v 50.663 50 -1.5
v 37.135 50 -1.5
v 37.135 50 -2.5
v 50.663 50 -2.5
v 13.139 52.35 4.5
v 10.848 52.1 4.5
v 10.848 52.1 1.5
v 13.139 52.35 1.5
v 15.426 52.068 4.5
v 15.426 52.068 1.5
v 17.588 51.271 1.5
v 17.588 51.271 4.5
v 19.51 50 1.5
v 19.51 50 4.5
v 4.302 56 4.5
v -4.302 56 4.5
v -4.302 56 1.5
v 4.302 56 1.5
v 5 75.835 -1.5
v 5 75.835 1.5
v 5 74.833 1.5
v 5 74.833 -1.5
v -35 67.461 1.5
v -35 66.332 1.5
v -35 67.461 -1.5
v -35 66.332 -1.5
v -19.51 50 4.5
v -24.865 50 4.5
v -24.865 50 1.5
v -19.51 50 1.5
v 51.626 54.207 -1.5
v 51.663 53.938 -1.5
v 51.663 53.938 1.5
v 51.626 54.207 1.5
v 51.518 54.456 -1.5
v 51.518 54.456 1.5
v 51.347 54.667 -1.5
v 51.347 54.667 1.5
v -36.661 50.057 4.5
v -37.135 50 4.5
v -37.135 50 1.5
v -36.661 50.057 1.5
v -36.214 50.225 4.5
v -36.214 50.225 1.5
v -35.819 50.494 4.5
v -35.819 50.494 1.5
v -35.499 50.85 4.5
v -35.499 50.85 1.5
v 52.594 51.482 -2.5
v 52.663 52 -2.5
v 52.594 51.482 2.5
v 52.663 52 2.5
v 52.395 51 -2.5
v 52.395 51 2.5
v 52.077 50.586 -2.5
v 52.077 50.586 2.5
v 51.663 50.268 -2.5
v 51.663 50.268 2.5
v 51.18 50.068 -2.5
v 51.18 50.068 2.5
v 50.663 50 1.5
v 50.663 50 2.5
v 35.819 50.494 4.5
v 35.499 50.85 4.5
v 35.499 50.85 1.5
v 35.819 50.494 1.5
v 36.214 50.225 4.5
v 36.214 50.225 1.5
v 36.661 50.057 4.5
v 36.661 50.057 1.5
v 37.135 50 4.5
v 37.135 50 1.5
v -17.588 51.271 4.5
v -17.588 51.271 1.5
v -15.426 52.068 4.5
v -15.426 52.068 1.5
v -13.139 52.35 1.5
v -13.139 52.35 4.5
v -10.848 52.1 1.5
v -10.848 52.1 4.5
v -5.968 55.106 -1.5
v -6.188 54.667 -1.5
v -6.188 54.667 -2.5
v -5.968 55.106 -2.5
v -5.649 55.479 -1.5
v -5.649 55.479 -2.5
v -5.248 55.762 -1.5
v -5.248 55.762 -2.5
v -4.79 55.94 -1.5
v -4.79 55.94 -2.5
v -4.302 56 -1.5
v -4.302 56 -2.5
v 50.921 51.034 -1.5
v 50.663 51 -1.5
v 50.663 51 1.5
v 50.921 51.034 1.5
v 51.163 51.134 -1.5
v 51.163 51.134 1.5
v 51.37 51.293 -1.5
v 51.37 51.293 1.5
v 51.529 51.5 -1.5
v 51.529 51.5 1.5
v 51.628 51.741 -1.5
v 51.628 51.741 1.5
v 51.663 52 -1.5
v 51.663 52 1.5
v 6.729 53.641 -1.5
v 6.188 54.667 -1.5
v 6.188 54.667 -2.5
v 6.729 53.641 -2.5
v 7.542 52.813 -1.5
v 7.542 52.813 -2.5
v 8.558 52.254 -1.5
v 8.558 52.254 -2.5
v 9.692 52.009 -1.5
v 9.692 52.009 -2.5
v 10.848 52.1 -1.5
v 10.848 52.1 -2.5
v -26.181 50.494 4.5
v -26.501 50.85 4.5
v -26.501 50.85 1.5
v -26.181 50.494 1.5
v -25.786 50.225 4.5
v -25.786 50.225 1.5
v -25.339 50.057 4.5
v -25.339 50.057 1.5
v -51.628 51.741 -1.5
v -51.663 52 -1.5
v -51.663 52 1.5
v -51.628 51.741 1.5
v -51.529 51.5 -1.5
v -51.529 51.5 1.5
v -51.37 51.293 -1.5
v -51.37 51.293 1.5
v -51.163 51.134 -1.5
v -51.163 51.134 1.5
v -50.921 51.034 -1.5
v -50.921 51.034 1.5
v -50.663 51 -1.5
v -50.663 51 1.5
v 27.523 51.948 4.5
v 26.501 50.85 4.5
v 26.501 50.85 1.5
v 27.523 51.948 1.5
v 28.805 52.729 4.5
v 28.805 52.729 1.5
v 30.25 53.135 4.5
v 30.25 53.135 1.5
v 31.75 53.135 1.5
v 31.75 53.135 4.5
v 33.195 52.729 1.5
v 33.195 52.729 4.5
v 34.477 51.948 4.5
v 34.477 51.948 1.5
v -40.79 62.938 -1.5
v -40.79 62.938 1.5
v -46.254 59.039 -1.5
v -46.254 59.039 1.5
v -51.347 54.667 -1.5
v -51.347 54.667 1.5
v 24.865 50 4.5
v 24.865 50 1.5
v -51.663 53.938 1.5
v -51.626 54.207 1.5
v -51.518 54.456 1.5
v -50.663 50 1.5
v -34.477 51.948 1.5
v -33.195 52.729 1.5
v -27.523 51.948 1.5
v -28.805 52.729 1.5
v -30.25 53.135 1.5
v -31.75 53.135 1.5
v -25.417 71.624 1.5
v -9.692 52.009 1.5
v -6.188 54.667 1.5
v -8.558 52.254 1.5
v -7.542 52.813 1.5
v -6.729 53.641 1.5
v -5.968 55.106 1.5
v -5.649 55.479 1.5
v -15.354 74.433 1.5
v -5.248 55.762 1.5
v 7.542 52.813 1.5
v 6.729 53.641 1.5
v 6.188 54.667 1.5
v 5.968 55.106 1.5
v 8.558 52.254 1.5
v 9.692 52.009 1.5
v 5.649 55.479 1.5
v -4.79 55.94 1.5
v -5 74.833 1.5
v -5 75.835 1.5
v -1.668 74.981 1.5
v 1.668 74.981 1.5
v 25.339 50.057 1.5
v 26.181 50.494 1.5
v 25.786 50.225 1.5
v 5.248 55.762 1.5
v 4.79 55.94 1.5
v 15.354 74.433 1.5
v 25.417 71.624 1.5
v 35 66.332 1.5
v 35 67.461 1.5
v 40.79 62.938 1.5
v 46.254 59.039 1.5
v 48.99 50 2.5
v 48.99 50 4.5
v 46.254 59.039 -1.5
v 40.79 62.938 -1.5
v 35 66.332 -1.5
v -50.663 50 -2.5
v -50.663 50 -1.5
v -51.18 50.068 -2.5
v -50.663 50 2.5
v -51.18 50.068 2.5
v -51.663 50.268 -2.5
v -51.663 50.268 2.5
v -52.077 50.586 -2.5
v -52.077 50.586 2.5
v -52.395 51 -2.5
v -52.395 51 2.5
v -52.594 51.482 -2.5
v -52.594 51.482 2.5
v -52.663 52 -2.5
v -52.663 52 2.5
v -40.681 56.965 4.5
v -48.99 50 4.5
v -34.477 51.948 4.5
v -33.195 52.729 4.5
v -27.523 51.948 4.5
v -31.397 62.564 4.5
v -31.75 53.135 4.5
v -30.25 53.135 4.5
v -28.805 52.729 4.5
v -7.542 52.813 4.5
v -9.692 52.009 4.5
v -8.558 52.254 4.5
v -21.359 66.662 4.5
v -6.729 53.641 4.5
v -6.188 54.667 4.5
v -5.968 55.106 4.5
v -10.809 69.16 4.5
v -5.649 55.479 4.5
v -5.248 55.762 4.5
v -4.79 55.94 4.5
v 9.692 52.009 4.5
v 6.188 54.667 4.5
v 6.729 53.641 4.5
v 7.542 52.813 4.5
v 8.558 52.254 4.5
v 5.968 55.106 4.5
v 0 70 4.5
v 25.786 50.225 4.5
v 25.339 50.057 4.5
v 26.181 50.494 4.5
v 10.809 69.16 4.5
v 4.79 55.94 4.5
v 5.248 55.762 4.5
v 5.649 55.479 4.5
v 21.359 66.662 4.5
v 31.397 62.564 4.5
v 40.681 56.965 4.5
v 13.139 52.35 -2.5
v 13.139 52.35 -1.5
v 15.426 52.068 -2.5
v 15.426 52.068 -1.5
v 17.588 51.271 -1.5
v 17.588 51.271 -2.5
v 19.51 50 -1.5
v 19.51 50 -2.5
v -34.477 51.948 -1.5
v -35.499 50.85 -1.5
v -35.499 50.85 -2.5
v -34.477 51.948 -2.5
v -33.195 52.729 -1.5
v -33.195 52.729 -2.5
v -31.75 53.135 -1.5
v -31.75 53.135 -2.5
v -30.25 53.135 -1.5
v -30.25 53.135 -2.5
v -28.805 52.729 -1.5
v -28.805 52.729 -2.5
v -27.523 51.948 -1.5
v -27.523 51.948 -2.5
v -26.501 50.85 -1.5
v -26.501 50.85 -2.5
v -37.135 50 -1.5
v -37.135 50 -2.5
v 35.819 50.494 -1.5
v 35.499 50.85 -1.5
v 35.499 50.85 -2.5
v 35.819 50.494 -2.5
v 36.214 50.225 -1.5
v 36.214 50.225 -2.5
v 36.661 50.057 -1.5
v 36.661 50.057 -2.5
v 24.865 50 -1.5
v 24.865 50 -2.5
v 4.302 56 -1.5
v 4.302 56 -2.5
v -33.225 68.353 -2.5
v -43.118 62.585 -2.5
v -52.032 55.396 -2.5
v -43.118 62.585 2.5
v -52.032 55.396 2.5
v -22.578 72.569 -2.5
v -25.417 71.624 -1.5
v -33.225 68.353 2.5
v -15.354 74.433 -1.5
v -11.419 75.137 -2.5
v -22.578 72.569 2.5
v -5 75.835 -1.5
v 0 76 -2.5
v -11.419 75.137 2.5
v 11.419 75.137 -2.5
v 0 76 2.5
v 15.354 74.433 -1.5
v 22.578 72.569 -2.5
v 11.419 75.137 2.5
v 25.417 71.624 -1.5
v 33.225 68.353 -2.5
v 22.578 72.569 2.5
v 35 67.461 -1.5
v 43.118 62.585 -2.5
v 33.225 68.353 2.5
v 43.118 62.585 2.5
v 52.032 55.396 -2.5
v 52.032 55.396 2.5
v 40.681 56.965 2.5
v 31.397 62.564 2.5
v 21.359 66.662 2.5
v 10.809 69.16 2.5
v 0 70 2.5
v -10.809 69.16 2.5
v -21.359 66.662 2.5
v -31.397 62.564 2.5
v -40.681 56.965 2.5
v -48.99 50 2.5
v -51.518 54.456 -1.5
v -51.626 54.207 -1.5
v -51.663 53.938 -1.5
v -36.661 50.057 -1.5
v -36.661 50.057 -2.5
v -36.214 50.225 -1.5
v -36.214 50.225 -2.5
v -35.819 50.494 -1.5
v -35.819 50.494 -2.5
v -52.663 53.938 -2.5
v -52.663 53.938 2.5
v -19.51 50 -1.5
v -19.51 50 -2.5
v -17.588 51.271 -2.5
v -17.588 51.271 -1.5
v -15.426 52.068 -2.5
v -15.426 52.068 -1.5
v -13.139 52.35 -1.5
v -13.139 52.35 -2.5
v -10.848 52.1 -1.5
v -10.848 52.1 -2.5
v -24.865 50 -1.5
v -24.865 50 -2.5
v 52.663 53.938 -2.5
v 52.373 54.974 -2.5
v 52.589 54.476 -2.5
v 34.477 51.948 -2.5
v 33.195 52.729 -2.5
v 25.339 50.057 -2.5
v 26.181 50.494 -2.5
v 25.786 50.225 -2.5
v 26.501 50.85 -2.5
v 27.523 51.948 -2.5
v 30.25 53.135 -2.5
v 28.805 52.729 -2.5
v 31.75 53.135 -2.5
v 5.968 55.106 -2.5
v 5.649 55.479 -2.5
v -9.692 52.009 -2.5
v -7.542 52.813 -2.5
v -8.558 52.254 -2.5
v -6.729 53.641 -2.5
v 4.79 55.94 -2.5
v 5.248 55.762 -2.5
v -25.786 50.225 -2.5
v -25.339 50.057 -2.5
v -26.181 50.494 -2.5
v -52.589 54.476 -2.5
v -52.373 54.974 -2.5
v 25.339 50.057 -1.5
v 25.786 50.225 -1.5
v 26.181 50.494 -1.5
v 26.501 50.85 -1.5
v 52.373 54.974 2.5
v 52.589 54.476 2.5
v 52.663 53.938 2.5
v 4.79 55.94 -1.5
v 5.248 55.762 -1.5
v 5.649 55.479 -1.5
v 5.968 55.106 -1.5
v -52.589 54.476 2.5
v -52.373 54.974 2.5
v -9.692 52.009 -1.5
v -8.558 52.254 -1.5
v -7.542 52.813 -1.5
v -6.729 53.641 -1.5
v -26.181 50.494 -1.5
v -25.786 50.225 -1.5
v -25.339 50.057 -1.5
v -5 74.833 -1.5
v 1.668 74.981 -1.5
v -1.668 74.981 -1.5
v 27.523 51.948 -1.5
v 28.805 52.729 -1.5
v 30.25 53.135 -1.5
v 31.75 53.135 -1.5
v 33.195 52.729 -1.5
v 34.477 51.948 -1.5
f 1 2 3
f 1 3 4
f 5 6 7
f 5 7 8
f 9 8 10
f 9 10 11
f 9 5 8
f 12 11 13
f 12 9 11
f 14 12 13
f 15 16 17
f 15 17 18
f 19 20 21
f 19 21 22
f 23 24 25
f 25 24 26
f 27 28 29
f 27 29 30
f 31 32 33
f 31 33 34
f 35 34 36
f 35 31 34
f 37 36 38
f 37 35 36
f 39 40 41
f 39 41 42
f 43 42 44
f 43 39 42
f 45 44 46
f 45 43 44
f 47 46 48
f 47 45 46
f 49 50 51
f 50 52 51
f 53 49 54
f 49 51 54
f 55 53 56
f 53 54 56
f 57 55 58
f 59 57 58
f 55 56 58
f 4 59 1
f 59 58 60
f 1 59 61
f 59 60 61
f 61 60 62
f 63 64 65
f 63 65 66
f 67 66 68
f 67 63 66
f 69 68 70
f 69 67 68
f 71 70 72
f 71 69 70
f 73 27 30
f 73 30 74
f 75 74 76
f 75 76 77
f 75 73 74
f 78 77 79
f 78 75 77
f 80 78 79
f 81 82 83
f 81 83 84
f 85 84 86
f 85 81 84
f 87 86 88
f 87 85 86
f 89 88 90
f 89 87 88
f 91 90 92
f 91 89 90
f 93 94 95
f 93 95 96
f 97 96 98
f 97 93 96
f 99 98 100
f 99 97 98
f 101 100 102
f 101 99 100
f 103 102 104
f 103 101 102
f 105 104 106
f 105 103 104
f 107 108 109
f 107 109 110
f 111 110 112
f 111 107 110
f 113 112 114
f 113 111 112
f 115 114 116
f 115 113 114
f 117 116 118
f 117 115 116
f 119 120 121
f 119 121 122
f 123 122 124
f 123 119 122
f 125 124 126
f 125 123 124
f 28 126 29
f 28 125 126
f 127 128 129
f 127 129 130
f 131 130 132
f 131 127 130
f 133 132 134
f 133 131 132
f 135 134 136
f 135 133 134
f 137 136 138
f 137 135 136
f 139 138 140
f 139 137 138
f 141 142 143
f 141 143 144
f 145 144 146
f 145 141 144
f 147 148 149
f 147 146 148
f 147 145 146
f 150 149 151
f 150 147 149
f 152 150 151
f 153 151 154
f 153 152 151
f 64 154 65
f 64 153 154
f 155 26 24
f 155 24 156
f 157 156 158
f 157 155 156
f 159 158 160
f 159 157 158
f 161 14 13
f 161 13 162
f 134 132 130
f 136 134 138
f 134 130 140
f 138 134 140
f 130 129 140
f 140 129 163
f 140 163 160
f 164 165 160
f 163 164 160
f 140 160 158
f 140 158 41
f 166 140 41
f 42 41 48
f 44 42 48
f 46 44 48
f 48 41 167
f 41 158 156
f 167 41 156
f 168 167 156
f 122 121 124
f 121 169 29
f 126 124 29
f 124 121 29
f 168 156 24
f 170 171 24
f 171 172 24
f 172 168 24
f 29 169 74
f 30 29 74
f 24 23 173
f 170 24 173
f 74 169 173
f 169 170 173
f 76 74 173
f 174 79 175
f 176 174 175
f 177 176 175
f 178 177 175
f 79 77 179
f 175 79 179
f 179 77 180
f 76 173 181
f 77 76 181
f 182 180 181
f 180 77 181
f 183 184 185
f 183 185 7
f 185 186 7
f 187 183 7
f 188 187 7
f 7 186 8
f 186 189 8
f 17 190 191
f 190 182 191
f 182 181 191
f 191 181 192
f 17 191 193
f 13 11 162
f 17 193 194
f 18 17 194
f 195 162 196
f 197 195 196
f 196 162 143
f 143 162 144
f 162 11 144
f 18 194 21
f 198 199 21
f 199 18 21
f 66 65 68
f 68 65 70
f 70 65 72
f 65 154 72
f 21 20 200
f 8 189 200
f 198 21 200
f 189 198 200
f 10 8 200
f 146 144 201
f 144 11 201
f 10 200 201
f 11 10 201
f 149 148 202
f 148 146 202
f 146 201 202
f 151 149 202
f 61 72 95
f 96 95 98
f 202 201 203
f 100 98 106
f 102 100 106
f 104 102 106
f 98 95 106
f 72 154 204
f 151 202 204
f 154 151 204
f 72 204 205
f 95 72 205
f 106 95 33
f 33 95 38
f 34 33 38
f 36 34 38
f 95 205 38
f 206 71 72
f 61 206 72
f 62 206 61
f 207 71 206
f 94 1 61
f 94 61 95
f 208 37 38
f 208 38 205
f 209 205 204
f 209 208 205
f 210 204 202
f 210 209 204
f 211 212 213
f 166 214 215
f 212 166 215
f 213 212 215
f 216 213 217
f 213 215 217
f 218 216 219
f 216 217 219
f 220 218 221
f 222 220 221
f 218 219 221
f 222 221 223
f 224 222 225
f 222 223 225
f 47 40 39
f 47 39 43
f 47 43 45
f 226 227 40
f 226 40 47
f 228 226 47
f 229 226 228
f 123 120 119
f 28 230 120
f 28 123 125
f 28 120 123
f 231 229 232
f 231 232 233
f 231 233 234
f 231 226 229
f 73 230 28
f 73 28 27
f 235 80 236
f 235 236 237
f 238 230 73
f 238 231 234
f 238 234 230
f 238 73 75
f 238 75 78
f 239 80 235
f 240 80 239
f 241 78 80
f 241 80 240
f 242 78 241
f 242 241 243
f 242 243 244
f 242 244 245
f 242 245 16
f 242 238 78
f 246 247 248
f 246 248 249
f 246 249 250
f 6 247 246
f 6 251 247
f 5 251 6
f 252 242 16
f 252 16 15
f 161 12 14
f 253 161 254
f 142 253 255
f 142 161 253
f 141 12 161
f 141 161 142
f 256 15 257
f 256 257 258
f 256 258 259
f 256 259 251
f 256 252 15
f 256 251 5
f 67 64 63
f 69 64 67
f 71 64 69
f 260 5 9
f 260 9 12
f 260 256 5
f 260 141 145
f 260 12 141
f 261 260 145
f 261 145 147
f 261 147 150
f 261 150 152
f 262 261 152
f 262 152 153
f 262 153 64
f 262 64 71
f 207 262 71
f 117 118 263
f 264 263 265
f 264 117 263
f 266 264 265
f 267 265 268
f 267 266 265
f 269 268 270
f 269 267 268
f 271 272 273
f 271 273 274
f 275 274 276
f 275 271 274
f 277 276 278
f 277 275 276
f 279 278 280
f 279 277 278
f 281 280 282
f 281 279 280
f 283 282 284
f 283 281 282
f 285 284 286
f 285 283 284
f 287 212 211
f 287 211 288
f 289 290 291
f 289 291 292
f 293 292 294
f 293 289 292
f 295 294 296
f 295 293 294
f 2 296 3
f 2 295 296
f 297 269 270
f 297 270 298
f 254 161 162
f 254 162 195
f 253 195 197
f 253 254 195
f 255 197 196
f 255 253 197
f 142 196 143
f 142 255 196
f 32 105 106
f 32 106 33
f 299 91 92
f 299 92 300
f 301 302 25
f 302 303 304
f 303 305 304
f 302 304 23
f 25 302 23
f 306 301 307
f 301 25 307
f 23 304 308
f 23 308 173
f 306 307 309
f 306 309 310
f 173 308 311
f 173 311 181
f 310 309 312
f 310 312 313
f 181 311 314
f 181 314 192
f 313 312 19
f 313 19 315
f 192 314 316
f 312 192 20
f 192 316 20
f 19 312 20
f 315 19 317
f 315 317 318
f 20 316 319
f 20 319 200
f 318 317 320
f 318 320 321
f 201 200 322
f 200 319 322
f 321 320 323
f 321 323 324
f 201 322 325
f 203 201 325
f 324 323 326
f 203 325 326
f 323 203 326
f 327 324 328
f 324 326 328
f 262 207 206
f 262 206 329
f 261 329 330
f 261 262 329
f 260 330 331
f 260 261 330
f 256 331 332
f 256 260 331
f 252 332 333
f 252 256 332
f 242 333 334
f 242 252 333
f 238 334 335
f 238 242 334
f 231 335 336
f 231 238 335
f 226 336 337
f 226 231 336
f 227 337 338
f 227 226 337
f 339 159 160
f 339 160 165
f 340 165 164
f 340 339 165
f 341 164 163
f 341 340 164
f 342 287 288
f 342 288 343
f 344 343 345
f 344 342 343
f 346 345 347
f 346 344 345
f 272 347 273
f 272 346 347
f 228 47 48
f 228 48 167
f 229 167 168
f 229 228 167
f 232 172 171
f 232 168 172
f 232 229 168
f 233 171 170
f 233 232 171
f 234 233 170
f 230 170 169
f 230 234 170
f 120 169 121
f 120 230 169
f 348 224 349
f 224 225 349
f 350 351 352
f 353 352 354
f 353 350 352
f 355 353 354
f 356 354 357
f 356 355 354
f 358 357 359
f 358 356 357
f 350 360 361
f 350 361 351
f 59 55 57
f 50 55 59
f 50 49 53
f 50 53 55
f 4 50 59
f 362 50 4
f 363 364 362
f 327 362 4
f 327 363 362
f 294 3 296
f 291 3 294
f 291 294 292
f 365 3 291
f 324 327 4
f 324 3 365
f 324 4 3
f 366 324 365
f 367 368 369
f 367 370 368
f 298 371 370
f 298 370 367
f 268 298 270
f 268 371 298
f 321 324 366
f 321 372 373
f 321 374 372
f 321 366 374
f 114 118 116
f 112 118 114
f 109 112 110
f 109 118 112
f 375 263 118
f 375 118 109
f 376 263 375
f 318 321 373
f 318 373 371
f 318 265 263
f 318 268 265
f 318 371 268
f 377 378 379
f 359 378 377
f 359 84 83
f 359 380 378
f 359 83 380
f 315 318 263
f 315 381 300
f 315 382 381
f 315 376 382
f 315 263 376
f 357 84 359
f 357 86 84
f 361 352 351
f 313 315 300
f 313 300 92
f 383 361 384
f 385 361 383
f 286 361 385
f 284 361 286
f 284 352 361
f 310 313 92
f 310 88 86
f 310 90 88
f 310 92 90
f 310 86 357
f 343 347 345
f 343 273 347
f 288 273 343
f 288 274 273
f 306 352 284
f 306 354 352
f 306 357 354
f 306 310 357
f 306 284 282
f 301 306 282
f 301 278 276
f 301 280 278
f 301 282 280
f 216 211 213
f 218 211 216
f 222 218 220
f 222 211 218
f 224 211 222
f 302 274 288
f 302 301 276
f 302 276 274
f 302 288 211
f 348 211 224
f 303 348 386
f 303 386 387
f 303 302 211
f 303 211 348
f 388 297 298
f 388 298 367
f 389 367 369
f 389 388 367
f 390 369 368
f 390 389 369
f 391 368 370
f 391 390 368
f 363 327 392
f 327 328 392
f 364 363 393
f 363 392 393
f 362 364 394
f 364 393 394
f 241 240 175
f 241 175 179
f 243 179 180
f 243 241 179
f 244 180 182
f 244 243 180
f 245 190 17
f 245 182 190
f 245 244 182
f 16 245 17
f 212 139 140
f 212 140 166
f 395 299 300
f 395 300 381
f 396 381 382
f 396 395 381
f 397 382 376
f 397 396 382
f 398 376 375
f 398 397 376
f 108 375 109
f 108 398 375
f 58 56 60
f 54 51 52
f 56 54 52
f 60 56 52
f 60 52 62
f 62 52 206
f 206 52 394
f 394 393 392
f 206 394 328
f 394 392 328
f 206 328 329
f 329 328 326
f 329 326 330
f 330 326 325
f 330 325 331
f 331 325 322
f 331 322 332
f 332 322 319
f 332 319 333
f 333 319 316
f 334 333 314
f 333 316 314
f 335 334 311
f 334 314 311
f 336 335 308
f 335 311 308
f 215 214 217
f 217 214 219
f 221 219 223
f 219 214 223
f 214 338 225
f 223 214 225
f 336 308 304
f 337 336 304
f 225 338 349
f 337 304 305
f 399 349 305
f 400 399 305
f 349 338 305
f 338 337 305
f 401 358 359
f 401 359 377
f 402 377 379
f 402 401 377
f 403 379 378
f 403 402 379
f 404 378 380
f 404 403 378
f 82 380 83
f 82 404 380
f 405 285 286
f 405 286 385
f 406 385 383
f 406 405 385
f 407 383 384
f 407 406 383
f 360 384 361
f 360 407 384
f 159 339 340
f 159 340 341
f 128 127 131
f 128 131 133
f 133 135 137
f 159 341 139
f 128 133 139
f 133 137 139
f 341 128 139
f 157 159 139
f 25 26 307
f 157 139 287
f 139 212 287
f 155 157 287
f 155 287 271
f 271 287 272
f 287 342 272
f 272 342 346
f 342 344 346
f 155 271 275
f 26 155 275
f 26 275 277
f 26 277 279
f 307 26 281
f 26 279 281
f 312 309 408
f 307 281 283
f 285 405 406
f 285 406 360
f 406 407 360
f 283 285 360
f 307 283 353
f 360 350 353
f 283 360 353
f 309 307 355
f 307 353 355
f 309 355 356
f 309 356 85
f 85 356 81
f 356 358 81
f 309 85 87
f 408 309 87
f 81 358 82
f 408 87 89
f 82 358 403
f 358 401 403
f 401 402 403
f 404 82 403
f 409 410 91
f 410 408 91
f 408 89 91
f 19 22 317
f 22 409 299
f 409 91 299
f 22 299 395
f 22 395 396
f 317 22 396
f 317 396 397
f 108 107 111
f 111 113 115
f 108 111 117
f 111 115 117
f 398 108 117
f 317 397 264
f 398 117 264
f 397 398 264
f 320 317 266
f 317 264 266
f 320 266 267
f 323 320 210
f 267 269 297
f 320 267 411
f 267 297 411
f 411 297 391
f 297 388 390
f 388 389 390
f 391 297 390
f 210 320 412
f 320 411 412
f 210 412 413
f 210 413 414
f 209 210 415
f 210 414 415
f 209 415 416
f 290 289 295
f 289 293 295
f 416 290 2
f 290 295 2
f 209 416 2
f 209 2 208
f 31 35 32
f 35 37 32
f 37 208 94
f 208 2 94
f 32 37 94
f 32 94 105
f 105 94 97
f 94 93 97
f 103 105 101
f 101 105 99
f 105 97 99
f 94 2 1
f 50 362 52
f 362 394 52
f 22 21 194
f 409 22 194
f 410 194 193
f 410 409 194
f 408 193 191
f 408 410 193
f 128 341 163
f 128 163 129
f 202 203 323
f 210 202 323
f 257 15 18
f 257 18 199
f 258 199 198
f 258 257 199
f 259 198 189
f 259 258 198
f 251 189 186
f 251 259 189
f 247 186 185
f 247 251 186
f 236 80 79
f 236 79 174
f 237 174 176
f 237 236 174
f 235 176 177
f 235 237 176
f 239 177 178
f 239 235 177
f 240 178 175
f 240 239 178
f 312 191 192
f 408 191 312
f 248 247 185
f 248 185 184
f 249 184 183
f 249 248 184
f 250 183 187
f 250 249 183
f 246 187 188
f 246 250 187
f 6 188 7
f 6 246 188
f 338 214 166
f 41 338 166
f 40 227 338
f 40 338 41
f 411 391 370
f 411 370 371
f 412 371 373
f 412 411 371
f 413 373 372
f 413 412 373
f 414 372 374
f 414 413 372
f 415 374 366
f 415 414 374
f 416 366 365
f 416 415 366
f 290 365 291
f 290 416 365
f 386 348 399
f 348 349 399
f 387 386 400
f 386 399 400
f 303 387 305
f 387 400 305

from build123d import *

# Parameters (mm, degrees)
BOSS_EXTRUDE1_DEPTH = 2.5
SHELL1_START        = -1.5
SHELL1_DEPTH        = 3
BOSS_EXTRUDE2_START = 2
BOSS_EXTRUDE2_DEPTH = 2
SKETCH4_W           = 30
SKETCH4_H           = 3
CUT_EXTRUDE1_DEPTH  = 100


# Read off the part's stored shape, not the designer's step: Shell1
with BuildPart() as part:
    # Sketch1 → Boss-Extrude1 (new, symmetric)
    with BuildSketch(Plane.XY):
        with BuildLine():
            ThreePointArc((-50.662558564, 50), (-52.076772126, 50.585786438), (-52.662558564, 52))
            Line((-52.662558564, 52), (-52.662558564, 53.937975118))
            ThreePointArc((-52.662558564, 53.937975118), (-52.498112524, 54.732167576), (-52.031816903, 55.395758229))
            ThreePointArc((-52.031816903, 55.395758229), (0, 76), (52.031816903, 55.395758229))
            ThreePointArc((52.031816903, 55.395758229), (52.498112524, 54.732167576), (52.662558564, 53.937975118))
            Line((52.662558564, 53.937975118), (52.662558564, 52))
            ThreePointArc((52.662558564, 52), (52.076772126, 50.585786438), (50.662558564, 50))
            Line((50.662558564, 50), (48.989794856, 50))
            ThreePointArc((48.989794856, 50), (0, 70), (-48.989794856, 50))
            Line((-48.989794856, 50), (-50.662558564, 50))
        make_face()
        with BuildLine():
            ThreePointArc((4.302180061, 56), (5.456880599, 55.632993162), (6.187798144, 54.666666667))
            ThreePointArc((6.187798144, 54.666666667), (8.029260752, 52.496291392), (10.847853752, 52.1))
            ThreePointArc((10.847853752, 52.1), (15.425940788, 52.068491802), (19.510205144, 50))
            Line((19.510205144, 50), (24.864501465, 50))
            ThreePointArc((24.864501465, 50), (25.78632175, 50.22510638), (26.500634408, 50.849752638))
            ThreePointArc((26.500634408, 50.849752638), (31, 53.186572392), (35.499365592, 50.849752638))
            ThreePointArc((35.499365592, 50.849752638), (36.21367825, 50.22510638), (37.135498535, 50))
            Line((37.135498535, 50), (48.989794856, 50))
            ThreePointArc((48.989794856, 50), (0, 70), (-48.989794856, 50))
            Line((-48.989794856, 50), (-37.135498535, 50))
            ThreePointArc((-37.135498535, 50), (-36.21367825, 50.22510638), (-35.499365592, 50.849752638))
            ThreePointArc((-35.499365592, 50.849752638), (-31, 53.186572392), (-26.500634408, 50.849752638))
            ThreePointArc((-26.500634408, 50.849752638), (-25.78632175, 50.22510638), (-24.864501465, 50))
            Line((-24.864501465, 50), (-19.510205144, 50))
            ThreePointArc((-19.510205144, 50), (-15.425940788, 52.068491802), (-10.847853752, 52.1))
            ThreePointArc((-10.847853752, 52.1), (-8.029260752, 52.496291392), (-6.187798144, 54.666666667))
            ThreePointArc((-6.187798144, 54.666666667), (-5.456880599, 55.632993162), (-4.302180061, 56))
            Line((-4.302180061, 56), (4.302180061, 56))
        make_face()
    extrude(amount=BOSS_EXTRUDE1_DEPTH, both=True)

    # Shell1 outline → Shell1 (cut)
    with BuildSketch(Plane.XY.offset(SHELL1_START)):
        with BuildLine():
            Line((37.135498535, 50), (50.662558564, 50))
            Line((50.662558564, 50), (50.662558564, 51))
            ThreePointArc((50.662558564, 51), (51.369665345, 51.292893219), (51.662558564, 52))
            Line((51.662558564, 52), (51.662558564, 53.937975118))
            ThreePointArc((51.662558564, 53.937975118), (51.580335544, 54.335071347), (51.347187733, 54.666866673))
            ThreePointArc((51.347187733, 54.666866673), (0, 75), (-51.347187733, 54.666866673))
            ThreePointArc((-51.347187733, 54.666866673), (-51.580335544, 54.335071347), (-51.662558564, 53.937975118))
            Line((-51.662558564, 53.937975118), (-51.662558564, 52))
            ThreePointArc((-51.662558564, 52), (-51.369665345, 51.292893219), (-50.662558564, 51))
            Line((-50.662558564, 51), (-50.662558564, 50))
            Line((-50.662558564, 50), (-37.135498535, 50))
            ThreePointArc((-37.135498535, 50), (-36.21367825, 50.22510638), (-35.499365592, 50.849752638))
            ThreePointArc((-35.499365592, 50.849752638), (-31, 53.186572392), (-26.500634408, 50.849752638))
            ThreePointArc((-26.500634408, 50.849752638), (-25.78632175, 50.22510638), (-24.864501465, 50))
            Line((-24.864501465, 50), (-19.510205144, 50))
            ThreePointArc((-19.510205144, 50), (-15.425940787, 52.068491802), (-10.847853752, 52.1))
            ThreePointArc((-10.847853752, 52.1), (-8.029260752, 52.496291392), (-6.187798144, 54.666666667))
            ThreePointArc((-6.187798144, 54.666666667), (-5.456880599, 55.632993162), (-4.302180061, 56))
            Line((-4.302180061, 56), (4.302180061, 56))
            ThreePointArc((4.302180061, 56), (5.456880599, 55.632993162), (6.187798144, 54.666666667))
            ThreePointArc((6.187798144, 54.666666667), (8.029260752, 52.496291392), (10.847853752, 52.1))
            ThreePointArc((10.847853752, 52.1), (15.425940787, 52.068491802), (19.510205144, 50))
            Line((19.510205144, 50), (24.864501465, 50))
            ThreePointArc((24.864501465, 50), (25.78632175, 50.22510638), (26.500634408, 50.849752638))
            ThreePointArc((26.500634408, 50.849752638), (31, 53.186572392), (35.499365592, 50.849752638))
            ThreePointArc((35.499365592, 50.849752638), (36.21367825, 50.22510638), (37.135498535, 50))
        make_face()
    extrude(amount=SHELL1_DEPTH, mode=Mode.SUBTRACT)

    # Sketch3 → Boss-Extrude2 (add)
    with BuildSketch(Plane.XY.offset(2.5).offset(BOSS_EXTRUDE2_START)):
        with BuildLine():
            ThreePointArc((48.989794856, 50), (0, 70), (-48.989794856, 50))
            Line((-48.989794856, 50), (-37.135498535, 50))
            ThreePointArc((-37.135498535, 50), (-36.21367825, 50.22510638), (-35.499365592, 50.849752638))
            ThreePointArc((-35.499365592, 50.849752638), (-31, 53.186572392), (-26.500634408, 50.849752638))
            ThreePointArc((-26.500634408, 50.849752638), (-25.78632175, 50.22510638), (-24.864501465, 50))
            Line((-24.864501465, 50), (-19.510205144, 50))
            ThreePointArc((-19.510205144, 50), (-15.425940788, 52.068491802), (-10.847853752, 52.1))
            ThreePointArc((-10.847853752, 52.1), (-8.029260752, 52.496291392), (-6.187798144, 54.666666667))
            ThreePointArc((-6.187798144, 54.666666667), (-5.456880599, 55.632993162), (-4.302180061, 56))
            Line((-4.302180061, 56), (4.302180061, 56))
            ThreePointArc((4.302180061, 56), (5.456880599, 55.632993162), (6.187798144, 54.666666667))
            ThreePointArc((6.187798144, 54.666666667), (8.029260752, 52.496291392), (10.847853752, 52.1))
            ThreePointArc((10.847853752, 52.1), (15.425940788, 52.068491802), (19.510205144, 50))
            Line((19.510205144, 50), (24.864501465, 50))
            ThreePointArc((24.864501465, 50), (25.78632175, 50.22510638), (26.500634408, 50.849752638))
            ThreePointArc((26.500634408, 50.849752638), (31, 53.186572392), (35.499365592, 50.849752638))
            ThreePointArc((35.499365592, 50.849752638), (36.21367825, 50.22510638), (37.135498535, 50))
            Line((37.135498535, 50), (48.989794856, 50))
        make_face()
    extrude(amount=-BOSS_EXTRUDE2_DEPTH)

    # Sketch4 → Cut-Extrude1 (cut, symmetric)
    with BuildSketch(Plane(origin=(0, 0, 0), x_dir=(1, 0, 0), z_dir=(0, 1, 0))):
        with Locations((-20, 0)):
            Rectangle(SKETCH4_W, SKETCH4_H)
        with Locations((20, 0)):
            Rectangle(SKETCH4_W, SKETCH4_H)
    extrude(amount=CUT_EXTRUDE1_DEPTH, both=True, mode=Mode.SUBTRACT)


solid = part.part
